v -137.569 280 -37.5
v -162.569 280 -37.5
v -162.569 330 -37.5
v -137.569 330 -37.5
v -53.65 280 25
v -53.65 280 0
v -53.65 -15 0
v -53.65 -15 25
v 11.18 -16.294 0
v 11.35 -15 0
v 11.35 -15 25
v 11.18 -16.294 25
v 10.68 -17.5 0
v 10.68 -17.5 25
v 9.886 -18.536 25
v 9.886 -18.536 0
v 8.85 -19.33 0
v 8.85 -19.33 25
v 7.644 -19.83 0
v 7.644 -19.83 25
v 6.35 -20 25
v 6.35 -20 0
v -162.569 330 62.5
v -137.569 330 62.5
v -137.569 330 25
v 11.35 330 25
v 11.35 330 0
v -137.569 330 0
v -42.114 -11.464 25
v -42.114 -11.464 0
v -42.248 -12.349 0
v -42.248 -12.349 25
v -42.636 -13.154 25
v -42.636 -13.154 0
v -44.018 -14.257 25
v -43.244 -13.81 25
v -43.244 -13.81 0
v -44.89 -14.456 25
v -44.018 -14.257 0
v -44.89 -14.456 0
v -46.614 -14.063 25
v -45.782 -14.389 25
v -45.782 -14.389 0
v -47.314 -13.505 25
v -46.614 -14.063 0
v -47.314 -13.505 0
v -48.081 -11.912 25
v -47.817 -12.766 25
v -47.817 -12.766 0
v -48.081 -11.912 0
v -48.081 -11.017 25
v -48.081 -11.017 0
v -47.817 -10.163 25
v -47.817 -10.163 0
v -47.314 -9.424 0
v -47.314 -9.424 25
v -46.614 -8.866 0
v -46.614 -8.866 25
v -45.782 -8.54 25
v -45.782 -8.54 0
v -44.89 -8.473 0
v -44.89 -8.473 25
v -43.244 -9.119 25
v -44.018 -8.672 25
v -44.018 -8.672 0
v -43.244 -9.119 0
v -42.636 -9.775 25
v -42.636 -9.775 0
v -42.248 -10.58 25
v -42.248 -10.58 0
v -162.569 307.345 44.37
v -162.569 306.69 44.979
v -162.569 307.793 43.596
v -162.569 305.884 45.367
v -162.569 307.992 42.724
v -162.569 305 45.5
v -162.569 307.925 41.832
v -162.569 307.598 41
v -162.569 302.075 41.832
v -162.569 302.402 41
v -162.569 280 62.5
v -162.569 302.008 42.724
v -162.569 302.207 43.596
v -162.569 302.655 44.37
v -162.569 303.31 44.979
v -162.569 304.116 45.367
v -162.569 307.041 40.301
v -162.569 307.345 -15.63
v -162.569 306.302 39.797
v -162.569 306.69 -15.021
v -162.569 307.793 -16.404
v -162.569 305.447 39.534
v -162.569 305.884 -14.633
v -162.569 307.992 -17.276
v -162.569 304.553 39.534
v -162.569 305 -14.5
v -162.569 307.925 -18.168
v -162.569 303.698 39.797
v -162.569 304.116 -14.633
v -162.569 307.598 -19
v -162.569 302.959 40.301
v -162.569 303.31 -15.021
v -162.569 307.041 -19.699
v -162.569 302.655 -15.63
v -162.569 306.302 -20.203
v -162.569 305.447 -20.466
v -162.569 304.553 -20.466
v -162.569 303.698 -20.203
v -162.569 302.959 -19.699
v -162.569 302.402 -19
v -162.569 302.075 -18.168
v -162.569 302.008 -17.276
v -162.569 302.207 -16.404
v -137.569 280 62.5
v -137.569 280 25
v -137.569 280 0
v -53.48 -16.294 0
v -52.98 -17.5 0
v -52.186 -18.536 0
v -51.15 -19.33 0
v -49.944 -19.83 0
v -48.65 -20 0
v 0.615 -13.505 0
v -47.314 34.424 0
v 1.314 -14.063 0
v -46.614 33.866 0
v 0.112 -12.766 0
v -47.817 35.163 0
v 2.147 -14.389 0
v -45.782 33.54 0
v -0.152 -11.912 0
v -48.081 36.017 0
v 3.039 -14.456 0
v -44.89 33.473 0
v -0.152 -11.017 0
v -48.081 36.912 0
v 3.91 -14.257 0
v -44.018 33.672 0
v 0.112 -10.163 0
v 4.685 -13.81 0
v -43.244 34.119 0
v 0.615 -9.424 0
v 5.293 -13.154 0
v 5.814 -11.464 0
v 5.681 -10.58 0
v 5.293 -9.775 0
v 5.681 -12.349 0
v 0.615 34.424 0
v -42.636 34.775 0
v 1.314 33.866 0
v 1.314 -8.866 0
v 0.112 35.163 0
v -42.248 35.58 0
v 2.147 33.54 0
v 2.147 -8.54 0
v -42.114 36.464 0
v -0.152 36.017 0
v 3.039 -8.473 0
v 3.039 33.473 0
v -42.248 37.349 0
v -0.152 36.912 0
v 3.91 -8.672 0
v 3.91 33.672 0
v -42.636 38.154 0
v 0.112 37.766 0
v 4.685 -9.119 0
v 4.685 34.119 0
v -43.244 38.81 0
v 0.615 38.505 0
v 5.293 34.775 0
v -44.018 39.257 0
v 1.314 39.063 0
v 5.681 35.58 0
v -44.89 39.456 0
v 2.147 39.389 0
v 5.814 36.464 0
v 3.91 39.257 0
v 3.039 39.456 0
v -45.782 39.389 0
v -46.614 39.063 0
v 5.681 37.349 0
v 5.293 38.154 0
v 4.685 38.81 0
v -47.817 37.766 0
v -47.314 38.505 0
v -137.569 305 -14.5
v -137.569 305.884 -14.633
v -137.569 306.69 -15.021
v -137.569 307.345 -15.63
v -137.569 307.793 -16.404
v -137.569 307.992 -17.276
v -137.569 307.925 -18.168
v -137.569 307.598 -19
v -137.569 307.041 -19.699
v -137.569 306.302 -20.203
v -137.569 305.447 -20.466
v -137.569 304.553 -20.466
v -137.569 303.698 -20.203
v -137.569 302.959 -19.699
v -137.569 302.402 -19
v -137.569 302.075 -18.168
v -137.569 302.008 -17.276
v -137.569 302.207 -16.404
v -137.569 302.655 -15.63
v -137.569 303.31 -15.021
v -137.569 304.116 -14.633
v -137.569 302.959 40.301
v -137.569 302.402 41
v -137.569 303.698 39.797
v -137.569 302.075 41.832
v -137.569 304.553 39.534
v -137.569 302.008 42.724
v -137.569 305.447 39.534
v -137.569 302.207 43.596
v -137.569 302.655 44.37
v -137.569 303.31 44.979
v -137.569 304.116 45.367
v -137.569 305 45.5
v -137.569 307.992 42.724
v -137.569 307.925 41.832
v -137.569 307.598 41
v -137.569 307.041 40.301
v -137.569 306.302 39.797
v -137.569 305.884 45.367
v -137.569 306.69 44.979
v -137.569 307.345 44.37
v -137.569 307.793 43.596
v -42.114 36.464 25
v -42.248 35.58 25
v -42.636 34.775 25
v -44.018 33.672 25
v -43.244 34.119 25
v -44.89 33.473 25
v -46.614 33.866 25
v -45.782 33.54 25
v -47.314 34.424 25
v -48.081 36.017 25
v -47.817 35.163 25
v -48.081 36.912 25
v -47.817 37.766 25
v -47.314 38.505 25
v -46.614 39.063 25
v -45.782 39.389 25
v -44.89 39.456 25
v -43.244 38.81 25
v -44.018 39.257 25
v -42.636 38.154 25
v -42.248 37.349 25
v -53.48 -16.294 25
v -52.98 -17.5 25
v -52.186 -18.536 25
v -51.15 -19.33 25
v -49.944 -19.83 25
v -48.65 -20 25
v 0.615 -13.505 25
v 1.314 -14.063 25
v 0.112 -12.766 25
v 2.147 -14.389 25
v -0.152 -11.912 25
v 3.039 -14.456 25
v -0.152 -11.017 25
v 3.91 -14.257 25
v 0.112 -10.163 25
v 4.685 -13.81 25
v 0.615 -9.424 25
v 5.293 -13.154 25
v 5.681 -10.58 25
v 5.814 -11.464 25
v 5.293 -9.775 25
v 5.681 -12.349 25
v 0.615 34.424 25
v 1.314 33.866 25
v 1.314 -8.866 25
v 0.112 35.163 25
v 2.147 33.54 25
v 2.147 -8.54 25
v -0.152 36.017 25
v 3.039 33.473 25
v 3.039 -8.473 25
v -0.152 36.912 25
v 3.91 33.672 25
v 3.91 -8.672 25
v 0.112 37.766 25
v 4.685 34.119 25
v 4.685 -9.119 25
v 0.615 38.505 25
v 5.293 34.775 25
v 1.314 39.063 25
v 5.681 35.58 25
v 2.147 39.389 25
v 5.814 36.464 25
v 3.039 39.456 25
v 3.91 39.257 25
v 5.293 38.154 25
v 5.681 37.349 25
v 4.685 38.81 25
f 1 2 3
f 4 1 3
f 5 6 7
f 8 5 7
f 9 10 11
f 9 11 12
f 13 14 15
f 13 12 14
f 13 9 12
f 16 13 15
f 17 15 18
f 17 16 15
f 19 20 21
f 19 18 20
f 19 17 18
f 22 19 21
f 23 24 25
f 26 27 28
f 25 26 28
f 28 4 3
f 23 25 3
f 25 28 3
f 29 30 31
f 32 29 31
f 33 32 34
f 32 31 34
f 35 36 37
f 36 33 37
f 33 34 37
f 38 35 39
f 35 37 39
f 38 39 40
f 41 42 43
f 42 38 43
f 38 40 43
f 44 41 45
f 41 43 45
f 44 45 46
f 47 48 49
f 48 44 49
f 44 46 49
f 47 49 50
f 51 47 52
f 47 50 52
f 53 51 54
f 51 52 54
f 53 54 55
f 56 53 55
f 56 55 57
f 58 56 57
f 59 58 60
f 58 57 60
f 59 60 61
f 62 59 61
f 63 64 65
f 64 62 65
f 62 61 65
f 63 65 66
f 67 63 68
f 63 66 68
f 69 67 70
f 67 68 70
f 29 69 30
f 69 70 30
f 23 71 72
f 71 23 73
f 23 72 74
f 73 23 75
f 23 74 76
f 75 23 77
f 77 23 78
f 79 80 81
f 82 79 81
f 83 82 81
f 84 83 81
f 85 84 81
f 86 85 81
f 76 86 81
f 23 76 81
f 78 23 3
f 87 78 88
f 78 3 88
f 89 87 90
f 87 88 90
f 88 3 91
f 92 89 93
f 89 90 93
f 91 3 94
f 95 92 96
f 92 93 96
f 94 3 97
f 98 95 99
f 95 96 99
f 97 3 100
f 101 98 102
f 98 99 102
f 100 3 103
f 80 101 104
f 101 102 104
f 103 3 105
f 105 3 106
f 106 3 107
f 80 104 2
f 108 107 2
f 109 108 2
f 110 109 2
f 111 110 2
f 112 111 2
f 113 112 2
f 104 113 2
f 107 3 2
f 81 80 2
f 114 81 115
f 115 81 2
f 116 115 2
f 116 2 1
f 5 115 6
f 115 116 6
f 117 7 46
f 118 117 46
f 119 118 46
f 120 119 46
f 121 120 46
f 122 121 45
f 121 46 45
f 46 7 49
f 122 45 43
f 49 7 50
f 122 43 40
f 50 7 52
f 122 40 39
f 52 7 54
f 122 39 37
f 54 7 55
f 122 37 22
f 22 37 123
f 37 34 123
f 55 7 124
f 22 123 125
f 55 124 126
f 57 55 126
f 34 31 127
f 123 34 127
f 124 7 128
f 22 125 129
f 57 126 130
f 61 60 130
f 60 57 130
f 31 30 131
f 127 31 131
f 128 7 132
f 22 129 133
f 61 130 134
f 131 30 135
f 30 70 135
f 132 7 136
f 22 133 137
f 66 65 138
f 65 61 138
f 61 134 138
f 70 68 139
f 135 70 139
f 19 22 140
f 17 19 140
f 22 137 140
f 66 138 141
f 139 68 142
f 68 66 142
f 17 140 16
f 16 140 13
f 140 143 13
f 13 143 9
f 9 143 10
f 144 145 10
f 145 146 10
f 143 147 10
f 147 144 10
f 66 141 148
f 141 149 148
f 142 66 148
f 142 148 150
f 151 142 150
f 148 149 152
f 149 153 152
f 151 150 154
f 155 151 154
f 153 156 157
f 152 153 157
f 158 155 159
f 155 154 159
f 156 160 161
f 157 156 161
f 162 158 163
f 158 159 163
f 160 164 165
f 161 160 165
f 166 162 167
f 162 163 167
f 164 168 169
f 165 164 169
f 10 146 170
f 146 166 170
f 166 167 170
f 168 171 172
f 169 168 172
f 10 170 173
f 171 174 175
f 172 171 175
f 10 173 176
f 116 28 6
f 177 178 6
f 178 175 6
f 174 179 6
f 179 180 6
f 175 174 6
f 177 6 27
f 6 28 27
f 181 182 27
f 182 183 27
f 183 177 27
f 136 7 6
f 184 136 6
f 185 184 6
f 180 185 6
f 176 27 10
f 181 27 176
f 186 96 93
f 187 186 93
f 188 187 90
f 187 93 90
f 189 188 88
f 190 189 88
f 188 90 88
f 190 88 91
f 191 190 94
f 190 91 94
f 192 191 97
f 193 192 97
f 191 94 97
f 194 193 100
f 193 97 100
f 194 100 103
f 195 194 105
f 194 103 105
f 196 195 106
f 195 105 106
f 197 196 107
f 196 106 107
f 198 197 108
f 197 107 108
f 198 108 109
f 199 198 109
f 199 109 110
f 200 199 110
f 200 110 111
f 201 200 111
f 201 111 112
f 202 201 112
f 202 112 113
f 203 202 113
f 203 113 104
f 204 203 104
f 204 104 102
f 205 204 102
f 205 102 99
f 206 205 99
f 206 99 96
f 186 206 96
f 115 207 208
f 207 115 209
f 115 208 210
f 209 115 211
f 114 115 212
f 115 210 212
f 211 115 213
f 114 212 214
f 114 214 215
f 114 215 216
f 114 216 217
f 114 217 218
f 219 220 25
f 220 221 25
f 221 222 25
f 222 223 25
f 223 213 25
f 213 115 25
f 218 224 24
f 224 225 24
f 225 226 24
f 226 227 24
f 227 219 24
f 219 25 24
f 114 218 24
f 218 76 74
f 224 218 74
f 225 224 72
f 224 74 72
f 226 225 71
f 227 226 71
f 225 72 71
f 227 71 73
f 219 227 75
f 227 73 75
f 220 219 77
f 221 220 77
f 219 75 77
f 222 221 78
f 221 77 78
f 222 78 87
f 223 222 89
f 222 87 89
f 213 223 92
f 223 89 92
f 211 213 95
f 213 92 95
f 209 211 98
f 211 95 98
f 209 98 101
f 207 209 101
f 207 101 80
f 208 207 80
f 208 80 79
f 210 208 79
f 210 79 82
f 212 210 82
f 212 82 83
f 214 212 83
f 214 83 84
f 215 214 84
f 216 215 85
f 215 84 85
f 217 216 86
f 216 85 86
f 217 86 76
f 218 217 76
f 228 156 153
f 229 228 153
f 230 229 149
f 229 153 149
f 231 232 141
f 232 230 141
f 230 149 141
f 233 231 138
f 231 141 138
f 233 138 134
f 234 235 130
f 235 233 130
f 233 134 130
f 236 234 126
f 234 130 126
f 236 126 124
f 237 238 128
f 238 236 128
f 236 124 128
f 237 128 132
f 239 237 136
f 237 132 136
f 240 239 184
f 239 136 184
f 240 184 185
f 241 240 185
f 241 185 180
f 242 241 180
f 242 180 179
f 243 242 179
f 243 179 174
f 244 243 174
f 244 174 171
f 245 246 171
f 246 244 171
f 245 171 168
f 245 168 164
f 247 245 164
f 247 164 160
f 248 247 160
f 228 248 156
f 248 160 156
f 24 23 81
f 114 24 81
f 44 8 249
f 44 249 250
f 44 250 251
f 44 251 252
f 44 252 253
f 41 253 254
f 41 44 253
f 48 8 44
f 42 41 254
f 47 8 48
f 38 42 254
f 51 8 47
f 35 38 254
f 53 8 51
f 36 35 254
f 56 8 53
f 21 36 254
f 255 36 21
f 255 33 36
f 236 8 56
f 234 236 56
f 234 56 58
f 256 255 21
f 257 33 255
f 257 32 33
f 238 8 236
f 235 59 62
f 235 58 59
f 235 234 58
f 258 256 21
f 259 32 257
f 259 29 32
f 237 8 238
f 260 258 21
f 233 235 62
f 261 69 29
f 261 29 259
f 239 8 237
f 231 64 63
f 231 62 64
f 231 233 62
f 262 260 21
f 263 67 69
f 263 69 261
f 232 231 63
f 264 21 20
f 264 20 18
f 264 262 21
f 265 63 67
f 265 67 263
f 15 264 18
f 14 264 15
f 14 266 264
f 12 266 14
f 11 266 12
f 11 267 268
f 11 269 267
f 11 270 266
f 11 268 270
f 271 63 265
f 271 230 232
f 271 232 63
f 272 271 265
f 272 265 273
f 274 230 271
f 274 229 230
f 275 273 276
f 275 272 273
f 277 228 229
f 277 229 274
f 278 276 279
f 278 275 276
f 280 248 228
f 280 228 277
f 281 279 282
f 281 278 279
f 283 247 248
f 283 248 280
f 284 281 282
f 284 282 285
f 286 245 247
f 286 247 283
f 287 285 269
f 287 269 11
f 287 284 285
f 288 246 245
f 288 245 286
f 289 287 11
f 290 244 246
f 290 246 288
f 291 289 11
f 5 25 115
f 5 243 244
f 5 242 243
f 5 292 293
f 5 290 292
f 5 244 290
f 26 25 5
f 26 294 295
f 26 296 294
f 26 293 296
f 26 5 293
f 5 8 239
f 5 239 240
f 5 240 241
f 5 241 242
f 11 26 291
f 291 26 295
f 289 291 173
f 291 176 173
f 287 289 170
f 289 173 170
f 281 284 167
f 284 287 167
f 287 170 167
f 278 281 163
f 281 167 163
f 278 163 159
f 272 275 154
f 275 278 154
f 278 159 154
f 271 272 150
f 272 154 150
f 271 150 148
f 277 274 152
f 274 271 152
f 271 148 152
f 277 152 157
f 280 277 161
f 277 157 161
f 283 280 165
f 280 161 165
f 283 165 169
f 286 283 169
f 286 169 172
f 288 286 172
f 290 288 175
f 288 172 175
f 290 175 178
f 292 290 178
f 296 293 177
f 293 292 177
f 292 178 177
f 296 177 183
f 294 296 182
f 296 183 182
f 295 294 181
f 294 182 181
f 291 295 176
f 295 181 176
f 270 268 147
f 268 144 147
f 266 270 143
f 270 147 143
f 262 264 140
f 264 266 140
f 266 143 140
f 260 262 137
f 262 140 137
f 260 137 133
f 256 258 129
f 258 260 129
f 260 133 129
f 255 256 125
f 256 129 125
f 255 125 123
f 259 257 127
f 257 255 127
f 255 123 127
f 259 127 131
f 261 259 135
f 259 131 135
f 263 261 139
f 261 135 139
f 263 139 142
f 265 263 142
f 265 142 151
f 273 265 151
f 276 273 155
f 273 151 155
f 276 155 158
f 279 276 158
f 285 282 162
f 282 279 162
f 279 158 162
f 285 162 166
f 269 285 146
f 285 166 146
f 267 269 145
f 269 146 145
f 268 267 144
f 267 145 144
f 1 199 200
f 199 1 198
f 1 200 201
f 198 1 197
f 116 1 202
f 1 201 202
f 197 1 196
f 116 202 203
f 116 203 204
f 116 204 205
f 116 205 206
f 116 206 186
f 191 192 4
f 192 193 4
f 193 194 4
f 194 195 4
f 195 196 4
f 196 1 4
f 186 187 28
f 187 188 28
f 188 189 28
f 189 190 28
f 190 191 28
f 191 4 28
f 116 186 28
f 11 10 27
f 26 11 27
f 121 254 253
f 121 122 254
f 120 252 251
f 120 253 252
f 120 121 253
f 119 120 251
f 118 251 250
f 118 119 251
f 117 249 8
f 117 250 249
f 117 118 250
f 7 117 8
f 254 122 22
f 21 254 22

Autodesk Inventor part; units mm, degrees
ref_plane "YZ Plane" through (0, 0, 0) normal (1, 0, 0) x (0, 1, 0)
ref_plane "XZ Plane" through (0, 0, 0) normal (0, 1, 0) x (-1, 0, 0)
ref_plane "XY Plane" through (0, 0, 0) normal (0, 0, 1) x (1, 0, 0)
sketch "Sketch1" plane through (0, 0, 0) normal (0, 0, 1) x (1, 0, 0)
  line L0 (11.35, 40) -> (11.35, -15)
  line L1 (6.35, -20) -> (-48.65, -20)
  circle A0 centre (2.814466, -11.464466) radius 3
  circle A1 centre (-45.114466, -11.464466) radius 3
  circle A2 centre (-45.114466, 36.464466) radius 3
  circle A3 centre (2.814466, 36.464466) radius 3
  line L2 (-162.568945, -644.9995) -> (-162.568945, 135.0005)
  line L3 (11.35, -15) -> (11.35, 330)
  line L4 (-53.65, -15) -> (-53.65, 40)
  line L5 (-53.65, -15) -> (-53.65, 280)
  line L6 (11.35, 330) -> (-162.568945, 330)
  line L7 (-162.568945, 330) -> (-162.568945, 280)
  line L8 (-162.568945, 280) -> (-53.65, 280)
  line L9 (6.35, -20) -> (-48.65, -20)
  arc A4 (6.35, -20) -> (11.35, -15) centre (6.35, -15) ccw
  arc A5 (-53.65, -15) -> (-48.65, -20) centre (-48.65, -15) ccw
  circle A6 centre (2.814466, 36.464466) radius 3
  circle A7 centre (2.814466, -11.464466) radius 3
  circle A8 centre (-45.114466, -11.464466) radius 3
  circle A9 centre (-45.114466, 36.464466) radius 3
  point P0 (0, 0)
  dimension "d0" = 350
  dimension "d1" = 300
  dimension "d2" = 5
sketch "Sketch2" plane through (-162.568945, 280, 0) normal (-1, 0, 0) x (0, 0, 1)
  line L0 (0, 0) -> (25, 0)
  line L1 (0, 50) -> (25, 50)
  line L2 (25, 0) -> (25, 50)
  line L3 (-37.5, 50) -> (62.5, 50)
  line L4 (62.5, 50) -> (62.5, 0)
  line L5 (62.5, 0) -> (-37.5, 0)
  line L6 (-37.5, 0) -> (-37.5, 50)
  circle A0 centre (42.5, 25) radius 3
  circle A1 centre (-17.5, 25) radius 3
  point P0 (0, -280)
  point P1 (12.5, 50)
  point P2 (12.5, 50)
  point P3 (62.5, 25)
  point P4 (-37.5, 25)
  dimension "d4" = 50
  dimension "d5" = 50
  dimension "d6" = 25
  dimension "d7" = 20
  dimension "d8" = 20
  dimension "d9" = 6
sketch "Sketch1 outline for Plate1" plane through (0, 0, 0) normal (0, 0, 1) x (1, 0, 0)
  arc A0 (6.35, -20) -> (11.35, -15) centre (6.35, -15) ccw
  line L0 (-48.65, -20) -> (6.35, -20)
  line L1 (11.35, -15) -> (11.35, 330)
  arc A1 (-53.65, -15) -> (-48.65, -20) centre (-48.65, -15) ccw
  line L2 (11.35, 330) -> (-162.568945, 330)
  line L3 (-53.65, 280) -> (-53.65, -15)
  line L4 (-162.568945, 330) -> (-162.568945, 280)
  line L5 (-162.568945, 280) -> (-53.65, 280)
  circle A2 centre (-45.114466, -11.464466) radius 3
  circle A3 centre (2.814466, -11.464466) radius 3
  circle A4 centre (-45.114466, 36.464466) radius 3
  circle A5 centre (2.814466, 36.464466) radius 3
extrude "Plate1" add sketch "Sketch1 outline for Plate1" along normal blind 25
sketch "Sketch2 outline for Plate2" plane through (-162.568945, 280, 0) normal (-1, 0, 0) x (0, 0, 1)
  line L0 (-37.5, 50) -> (62.5, 50)
  line L1 (-37.5, 0) -> (-37.5, 50)
  line L2 (62.5, 50) -> (62.5, 0)
  line L3 (62.5, 0) -> (-37.5, 0)
  circle A0 centre (-17.5, 25) radius 3
  circle A1 centre (42.5, 25) radius 3
sheet face with bend "Face2" sketch "Sketch2 outline for Plate2" thickness 25 toward (1, 0, 0) bend radius 25
bend "Bend1"
equation "\"d3\" = Thickness"
equation "\"d10\" = BendRadius"
equation "\"d11\" = BendReliefWidth"
equation "\"d13\" = MinimumRemnant"
equation "\"d12\" = BendReliefDepth"
equation "\"d14\" = TransitionRadius"
equation "\"BendRadius\" = Thickness"
equation "\"BendReliefWidth\" = Thickness"
equation "\"BendReliefDepth\" = 0.5 * Thickness"
equation "\"TransitionRadius\" = BendRadius"
equation "\"JacobiRadiusSize\" = BendRadius"
equation "\"GapSize\" = Thickness"
equation "\"Thickness\" = 25"
equation "\"MinimumRemnant\" = 50"
properties part number "patas2"
